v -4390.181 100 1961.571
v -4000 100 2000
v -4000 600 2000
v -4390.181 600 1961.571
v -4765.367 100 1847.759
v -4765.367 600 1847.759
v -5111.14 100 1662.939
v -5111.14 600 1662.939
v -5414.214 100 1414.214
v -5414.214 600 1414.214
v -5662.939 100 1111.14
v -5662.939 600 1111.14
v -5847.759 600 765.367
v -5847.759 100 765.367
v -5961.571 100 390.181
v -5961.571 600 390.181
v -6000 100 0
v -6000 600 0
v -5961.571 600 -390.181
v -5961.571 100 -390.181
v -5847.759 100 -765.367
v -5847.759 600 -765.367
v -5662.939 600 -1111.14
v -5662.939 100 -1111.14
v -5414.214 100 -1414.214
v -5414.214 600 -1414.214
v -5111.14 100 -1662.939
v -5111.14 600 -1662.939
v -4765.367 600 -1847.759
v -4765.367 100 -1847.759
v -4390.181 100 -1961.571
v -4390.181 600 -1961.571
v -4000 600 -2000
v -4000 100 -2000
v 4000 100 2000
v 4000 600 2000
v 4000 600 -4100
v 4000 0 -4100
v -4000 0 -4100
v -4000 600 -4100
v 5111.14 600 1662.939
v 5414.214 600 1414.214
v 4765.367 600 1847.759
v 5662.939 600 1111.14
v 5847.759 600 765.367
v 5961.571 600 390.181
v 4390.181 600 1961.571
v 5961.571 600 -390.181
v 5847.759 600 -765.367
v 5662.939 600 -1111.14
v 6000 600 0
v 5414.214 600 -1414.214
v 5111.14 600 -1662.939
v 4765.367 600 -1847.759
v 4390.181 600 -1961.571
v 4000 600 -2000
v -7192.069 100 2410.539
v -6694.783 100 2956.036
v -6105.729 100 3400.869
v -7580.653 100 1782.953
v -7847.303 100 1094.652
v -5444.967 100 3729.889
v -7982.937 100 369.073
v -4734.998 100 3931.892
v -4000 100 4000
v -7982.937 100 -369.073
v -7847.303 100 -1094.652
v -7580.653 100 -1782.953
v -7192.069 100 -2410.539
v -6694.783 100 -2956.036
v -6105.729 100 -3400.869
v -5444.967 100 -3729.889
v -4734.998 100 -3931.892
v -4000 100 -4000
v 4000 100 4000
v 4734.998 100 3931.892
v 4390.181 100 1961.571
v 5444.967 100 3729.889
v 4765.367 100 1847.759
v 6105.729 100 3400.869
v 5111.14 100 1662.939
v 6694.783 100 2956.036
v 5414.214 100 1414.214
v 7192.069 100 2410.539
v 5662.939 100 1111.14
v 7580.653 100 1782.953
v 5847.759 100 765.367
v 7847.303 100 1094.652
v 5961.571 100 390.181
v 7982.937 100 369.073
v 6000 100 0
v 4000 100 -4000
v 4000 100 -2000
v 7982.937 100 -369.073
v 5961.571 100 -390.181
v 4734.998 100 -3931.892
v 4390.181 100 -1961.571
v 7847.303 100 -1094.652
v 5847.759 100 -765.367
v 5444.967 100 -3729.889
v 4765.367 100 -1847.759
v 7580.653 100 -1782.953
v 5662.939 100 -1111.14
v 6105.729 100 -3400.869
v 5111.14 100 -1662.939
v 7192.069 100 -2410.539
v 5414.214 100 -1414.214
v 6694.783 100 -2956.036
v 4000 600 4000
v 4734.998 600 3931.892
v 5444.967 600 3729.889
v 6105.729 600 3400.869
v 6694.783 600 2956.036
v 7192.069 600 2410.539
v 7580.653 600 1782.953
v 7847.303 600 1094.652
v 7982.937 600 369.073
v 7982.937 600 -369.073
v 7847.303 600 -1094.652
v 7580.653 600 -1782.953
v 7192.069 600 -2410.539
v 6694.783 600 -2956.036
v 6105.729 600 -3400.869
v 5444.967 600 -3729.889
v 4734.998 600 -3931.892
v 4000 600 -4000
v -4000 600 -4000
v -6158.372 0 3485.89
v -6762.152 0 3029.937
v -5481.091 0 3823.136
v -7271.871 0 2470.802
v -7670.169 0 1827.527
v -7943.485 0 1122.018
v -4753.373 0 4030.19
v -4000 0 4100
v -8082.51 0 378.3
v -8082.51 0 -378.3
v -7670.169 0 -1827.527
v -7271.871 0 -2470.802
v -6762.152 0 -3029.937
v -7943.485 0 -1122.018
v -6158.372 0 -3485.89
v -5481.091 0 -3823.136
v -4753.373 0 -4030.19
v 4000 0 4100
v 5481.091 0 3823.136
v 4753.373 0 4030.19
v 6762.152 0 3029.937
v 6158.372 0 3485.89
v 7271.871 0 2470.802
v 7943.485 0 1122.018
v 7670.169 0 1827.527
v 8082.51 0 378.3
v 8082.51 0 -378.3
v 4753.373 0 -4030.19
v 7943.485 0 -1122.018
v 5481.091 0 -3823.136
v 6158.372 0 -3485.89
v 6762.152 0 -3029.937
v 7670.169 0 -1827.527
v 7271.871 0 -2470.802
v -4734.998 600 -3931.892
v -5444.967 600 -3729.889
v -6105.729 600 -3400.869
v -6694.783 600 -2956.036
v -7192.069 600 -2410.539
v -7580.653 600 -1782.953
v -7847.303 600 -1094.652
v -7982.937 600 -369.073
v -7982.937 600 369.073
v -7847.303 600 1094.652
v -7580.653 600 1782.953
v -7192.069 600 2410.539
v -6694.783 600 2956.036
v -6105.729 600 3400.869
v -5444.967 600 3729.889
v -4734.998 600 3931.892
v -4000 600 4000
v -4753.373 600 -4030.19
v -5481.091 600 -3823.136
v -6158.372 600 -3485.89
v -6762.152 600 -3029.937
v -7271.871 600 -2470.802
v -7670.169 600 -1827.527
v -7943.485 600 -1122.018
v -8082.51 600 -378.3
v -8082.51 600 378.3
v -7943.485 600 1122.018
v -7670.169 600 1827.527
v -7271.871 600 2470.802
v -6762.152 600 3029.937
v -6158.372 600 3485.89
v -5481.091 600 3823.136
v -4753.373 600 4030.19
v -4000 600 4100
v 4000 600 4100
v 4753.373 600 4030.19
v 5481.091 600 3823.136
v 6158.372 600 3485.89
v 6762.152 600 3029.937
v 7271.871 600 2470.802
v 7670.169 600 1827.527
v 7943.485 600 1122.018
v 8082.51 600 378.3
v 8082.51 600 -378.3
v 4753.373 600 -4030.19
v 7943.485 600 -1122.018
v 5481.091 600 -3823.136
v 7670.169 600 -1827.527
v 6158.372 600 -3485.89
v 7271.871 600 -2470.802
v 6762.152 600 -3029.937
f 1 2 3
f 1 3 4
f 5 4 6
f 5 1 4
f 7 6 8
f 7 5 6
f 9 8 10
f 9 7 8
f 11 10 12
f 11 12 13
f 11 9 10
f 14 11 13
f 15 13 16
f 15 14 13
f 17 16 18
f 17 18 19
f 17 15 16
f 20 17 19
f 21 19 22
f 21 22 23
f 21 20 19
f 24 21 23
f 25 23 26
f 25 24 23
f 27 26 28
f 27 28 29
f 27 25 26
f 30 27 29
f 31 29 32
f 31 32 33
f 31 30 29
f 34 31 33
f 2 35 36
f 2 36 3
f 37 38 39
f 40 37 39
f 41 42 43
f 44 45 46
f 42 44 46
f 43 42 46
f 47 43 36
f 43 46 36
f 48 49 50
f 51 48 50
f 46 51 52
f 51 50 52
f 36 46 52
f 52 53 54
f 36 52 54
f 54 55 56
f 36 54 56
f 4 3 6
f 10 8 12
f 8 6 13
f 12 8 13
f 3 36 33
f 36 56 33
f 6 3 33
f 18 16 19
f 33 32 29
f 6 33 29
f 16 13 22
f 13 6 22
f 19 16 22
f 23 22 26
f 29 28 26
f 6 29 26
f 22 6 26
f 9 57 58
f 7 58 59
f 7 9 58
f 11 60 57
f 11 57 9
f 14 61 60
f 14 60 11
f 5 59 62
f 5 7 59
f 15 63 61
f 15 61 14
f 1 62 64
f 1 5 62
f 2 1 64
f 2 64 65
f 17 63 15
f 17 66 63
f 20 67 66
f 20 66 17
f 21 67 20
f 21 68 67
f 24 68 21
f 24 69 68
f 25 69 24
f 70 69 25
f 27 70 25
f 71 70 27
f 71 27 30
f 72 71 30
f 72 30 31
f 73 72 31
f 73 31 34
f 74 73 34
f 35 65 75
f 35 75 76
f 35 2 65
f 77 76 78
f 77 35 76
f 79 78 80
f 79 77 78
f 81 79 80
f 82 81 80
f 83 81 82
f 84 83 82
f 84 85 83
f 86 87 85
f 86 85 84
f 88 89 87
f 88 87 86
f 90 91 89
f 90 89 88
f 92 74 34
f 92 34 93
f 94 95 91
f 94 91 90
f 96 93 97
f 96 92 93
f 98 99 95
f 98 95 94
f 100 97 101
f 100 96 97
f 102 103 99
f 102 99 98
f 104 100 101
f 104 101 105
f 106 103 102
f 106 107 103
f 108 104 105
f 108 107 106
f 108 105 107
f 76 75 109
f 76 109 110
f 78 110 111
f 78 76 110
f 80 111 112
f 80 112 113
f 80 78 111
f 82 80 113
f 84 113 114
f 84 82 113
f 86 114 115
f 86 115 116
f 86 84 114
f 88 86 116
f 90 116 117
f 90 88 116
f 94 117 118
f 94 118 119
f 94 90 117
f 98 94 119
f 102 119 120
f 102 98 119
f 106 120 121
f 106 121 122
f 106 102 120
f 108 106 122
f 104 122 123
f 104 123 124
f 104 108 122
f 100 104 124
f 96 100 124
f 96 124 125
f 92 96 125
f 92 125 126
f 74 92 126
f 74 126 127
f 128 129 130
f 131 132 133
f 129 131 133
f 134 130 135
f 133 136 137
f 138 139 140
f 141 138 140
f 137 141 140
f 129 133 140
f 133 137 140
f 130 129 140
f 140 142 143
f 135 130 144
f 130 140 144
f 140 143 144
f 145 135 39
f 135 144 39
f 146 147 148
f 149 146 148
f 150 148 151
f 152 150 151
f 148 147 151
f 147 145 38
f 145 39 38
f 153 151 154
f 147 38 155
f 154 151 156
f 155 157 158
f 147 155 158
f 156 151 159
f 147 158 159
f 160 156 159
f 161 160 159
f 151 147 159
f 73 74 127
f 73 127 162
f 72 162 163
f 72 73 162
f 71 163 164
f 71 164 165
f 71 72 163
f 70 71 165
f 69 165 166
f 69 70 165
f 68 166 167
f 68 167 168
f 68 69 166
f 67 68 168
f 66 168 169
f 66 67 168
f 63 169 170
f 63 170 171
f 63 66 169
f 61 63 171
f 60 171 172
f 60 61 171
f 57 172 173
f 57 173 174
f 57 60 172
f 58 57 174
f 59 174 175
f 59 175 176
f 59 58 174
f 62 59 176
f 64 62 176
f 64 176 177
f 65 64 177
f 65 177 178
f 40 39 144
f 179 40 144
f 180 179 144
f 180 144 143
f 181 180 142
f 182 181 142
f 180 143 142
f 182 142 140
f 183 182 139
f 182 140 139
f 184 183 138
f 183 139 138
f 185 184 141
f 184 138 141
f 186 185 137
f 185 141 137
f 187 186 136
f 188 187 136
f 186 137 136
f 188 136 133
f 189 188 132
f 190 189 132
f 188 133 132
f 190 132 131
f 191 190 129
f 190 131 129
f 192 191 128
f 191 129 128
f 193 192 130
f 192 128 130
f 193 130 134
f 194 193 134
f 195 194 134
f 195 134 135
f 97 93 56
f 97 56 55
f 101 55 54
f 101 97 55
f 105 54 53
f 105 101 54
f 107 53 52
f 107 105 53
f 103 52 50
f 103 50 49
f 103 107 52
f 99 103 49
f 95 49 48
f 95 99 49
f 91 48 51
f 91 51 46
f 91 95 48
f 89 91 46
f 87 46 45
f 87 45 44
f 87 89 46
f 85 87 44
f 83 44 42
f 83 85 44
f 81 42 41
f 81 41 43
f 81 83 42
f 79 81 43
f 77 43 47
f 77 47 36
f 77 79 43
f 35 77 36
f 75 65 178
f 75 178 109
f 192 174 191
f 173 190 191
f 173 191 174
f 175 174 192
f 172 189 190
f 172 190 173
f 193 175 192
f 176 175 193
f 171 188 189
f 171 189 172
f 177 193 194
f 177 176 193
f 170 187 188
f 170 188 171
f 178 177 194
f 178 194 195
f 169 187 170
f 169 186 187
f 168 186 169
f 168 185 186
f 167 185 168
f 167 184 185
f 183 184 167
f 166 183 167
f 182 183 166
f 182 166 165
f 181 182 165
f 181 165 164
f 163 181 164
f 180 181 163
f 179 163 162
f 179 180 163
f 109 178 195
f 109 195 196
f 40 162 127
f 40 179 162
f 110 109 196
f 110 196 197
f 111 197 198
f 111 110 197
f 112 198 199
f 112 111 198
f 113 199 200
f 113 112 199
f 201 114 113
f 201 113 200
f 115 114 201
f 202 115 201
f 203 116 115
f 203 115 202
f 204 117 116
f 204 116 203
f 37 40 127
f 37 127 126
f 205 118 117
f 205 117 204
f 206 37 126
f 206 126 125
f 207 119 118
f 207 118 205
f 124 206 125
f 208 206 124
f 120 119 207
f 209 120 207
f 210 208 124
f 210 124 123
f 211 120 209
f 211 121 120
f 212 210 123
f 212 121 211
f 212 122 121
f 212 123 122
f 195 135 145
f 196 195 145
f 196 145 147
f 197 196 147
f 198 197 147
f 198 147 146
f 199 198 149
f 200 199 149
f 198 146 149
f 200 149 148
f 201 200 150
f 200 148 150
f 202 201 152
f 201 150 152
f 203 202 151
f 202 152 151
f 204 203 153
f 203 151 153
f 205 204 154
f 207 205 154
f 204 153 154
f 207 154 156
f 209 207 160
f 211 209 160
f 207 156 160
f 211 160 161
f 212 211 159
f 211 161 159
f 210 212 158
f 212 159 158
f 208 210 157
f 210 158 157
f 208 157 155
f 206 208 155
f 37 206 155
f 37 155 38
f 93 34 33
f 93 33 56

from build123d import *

# Parameters (mm, degrees)
BOSS_EXTRUDE1_DEPTH      = 100
BOSS_EXTRUDE2_DEPTH      = 500
BOSS_EXTRUDE2_DEPTH_BACK = 100
BOSS_EXTRUDE3_DEPTH      = 500
BOSS_EXTRUDE3_DEPTH_BACK = 100


with BuildPart() as part:
    # Sketch1 → Boss-Extrude1 (new body)
    with BuildSketch(Plane(origin=(0, 0, 0), x_dir=(1, 0, 0), z_dir=(0, 1, 0))):
        with BuildLine():
            Line((-4000, -4000), (4000, -4000))
            ThreePointArc((4000, -4000), (8000, 0), (4000, 4000))
            Line((4000, 4000), (-4000, 4000))
            ThreePointArc((-4000, 4000), (-8000, 0), (-4000, -4000))
        make_face()
        with BuildLine():
            Line((-4000, 2000), (4000, 2000))
            ThreePointArc((4000, 2000), (6000, 0), (4000, -2000))
            Line((4000, -2000), (-4000, -2000))
            ThreePointArc((-4000, -2000), (-6000, 0), (-4000, 2000))
        make_face(mode=Mode.SUBTRACT)
    extrude(amount=BOSS_EXTRUDE1_DEPTH)

    # Sketch2 → Boss-Extrude2 (add, two sides: drawn at the far end of the back side and taken through both)
    with BuildSketch(Plane(origin=(0, 100, 0), x_dir=(1, 0, 0), z_dir=(0, 1, 0)).offset(-BOSS_EXTRUDE2_DEPTH_BACK)):
        with BuildLine():
            Line((4000, 4100), (-4000, 4100))
            ThreePointArc((-4000, 4100), (-8100, 0), (-4000, -4100))
            Line((-4000, -4100), (4000, -4100))
            ThreePointArc((4000, -4100), (8100, 0), (4000, 4100))
        make_face()
        with BuildLine():
            Line((-4000, -4000), (4000, -4000))
            ThreePointArc((4000, -4000), (8000, 0), (4000, 4000))
            Line((4000, 4000), (-4000, 4000))
            ThreePointArc((-4000, 4000), (-8000, 0), (-4000, -4000))
        make_face(mode=Mode.SUBTRACT)
    extrude(amount=BOSS_EXTRUDE2_DEPTH + BOSS_EXTRUDE2_DEPTH_BACK)

    # Sketch3 → Boss-Extrude3 (add, two sides: drawn at the far end of the back side and taken through both)
    # profile 1 of 2: a face of its own
    with BuildSketch(Plane(origin=(0, 100, 0), x_dir=(1, 0, 0), z_dir=(0, 1, 0)).offset(-BOSS_EXTRUDE3_DEPTH_BACK)):
        with BuildLine():
            Line((-4000, 2000), (4000, 2000))
            ThreePointArc((4000, 2000), (6000, 0), (4000, -2000))
            Line((4000, -2000), (-4000, -2000))
            ThreePointArc((-4000, -2000), (-6000, 0), (-4000, 2000))
        make_face()
        with BuildLine():
            ThreePointArc((4000, -1900), (5900, 0), (4000, 1900))
            Line((4000, 1900), (-4000, 1900))
            ThreePointArc((-4000, 1900), (-5900, 0), (-4000, -1900))
            Line((-4000, -1900), (4000, -1900))
        make_face(mode=Mode.SUBTRACT)
    # profile 2 of 2: a face of its own
    with BuildSketch(Plane(origin=(0, 100, 0), x_dir=(1, 0, 0), z_dir=(0, 1, 0)).offset(-BOSS_EXTRUDE3_DEPTH_BACK)):
        with BuildLine():
            Line((4000, 2000), (-4000, 2000))
            ThreePointArc((-4000, 2000), (-6000, 0), (-4000, -2000))
            Line((-4000, -2000), (4000, -2000))
            ThreePointArc((4000, -2000), (6000, 0), (4000, 2000))
        make_face()
    extrude(amount=BOSS_EXTRUDE3_DEPTH + BOSS_EXTRUDE3_DEPTH_BACK)


solid = part.part
